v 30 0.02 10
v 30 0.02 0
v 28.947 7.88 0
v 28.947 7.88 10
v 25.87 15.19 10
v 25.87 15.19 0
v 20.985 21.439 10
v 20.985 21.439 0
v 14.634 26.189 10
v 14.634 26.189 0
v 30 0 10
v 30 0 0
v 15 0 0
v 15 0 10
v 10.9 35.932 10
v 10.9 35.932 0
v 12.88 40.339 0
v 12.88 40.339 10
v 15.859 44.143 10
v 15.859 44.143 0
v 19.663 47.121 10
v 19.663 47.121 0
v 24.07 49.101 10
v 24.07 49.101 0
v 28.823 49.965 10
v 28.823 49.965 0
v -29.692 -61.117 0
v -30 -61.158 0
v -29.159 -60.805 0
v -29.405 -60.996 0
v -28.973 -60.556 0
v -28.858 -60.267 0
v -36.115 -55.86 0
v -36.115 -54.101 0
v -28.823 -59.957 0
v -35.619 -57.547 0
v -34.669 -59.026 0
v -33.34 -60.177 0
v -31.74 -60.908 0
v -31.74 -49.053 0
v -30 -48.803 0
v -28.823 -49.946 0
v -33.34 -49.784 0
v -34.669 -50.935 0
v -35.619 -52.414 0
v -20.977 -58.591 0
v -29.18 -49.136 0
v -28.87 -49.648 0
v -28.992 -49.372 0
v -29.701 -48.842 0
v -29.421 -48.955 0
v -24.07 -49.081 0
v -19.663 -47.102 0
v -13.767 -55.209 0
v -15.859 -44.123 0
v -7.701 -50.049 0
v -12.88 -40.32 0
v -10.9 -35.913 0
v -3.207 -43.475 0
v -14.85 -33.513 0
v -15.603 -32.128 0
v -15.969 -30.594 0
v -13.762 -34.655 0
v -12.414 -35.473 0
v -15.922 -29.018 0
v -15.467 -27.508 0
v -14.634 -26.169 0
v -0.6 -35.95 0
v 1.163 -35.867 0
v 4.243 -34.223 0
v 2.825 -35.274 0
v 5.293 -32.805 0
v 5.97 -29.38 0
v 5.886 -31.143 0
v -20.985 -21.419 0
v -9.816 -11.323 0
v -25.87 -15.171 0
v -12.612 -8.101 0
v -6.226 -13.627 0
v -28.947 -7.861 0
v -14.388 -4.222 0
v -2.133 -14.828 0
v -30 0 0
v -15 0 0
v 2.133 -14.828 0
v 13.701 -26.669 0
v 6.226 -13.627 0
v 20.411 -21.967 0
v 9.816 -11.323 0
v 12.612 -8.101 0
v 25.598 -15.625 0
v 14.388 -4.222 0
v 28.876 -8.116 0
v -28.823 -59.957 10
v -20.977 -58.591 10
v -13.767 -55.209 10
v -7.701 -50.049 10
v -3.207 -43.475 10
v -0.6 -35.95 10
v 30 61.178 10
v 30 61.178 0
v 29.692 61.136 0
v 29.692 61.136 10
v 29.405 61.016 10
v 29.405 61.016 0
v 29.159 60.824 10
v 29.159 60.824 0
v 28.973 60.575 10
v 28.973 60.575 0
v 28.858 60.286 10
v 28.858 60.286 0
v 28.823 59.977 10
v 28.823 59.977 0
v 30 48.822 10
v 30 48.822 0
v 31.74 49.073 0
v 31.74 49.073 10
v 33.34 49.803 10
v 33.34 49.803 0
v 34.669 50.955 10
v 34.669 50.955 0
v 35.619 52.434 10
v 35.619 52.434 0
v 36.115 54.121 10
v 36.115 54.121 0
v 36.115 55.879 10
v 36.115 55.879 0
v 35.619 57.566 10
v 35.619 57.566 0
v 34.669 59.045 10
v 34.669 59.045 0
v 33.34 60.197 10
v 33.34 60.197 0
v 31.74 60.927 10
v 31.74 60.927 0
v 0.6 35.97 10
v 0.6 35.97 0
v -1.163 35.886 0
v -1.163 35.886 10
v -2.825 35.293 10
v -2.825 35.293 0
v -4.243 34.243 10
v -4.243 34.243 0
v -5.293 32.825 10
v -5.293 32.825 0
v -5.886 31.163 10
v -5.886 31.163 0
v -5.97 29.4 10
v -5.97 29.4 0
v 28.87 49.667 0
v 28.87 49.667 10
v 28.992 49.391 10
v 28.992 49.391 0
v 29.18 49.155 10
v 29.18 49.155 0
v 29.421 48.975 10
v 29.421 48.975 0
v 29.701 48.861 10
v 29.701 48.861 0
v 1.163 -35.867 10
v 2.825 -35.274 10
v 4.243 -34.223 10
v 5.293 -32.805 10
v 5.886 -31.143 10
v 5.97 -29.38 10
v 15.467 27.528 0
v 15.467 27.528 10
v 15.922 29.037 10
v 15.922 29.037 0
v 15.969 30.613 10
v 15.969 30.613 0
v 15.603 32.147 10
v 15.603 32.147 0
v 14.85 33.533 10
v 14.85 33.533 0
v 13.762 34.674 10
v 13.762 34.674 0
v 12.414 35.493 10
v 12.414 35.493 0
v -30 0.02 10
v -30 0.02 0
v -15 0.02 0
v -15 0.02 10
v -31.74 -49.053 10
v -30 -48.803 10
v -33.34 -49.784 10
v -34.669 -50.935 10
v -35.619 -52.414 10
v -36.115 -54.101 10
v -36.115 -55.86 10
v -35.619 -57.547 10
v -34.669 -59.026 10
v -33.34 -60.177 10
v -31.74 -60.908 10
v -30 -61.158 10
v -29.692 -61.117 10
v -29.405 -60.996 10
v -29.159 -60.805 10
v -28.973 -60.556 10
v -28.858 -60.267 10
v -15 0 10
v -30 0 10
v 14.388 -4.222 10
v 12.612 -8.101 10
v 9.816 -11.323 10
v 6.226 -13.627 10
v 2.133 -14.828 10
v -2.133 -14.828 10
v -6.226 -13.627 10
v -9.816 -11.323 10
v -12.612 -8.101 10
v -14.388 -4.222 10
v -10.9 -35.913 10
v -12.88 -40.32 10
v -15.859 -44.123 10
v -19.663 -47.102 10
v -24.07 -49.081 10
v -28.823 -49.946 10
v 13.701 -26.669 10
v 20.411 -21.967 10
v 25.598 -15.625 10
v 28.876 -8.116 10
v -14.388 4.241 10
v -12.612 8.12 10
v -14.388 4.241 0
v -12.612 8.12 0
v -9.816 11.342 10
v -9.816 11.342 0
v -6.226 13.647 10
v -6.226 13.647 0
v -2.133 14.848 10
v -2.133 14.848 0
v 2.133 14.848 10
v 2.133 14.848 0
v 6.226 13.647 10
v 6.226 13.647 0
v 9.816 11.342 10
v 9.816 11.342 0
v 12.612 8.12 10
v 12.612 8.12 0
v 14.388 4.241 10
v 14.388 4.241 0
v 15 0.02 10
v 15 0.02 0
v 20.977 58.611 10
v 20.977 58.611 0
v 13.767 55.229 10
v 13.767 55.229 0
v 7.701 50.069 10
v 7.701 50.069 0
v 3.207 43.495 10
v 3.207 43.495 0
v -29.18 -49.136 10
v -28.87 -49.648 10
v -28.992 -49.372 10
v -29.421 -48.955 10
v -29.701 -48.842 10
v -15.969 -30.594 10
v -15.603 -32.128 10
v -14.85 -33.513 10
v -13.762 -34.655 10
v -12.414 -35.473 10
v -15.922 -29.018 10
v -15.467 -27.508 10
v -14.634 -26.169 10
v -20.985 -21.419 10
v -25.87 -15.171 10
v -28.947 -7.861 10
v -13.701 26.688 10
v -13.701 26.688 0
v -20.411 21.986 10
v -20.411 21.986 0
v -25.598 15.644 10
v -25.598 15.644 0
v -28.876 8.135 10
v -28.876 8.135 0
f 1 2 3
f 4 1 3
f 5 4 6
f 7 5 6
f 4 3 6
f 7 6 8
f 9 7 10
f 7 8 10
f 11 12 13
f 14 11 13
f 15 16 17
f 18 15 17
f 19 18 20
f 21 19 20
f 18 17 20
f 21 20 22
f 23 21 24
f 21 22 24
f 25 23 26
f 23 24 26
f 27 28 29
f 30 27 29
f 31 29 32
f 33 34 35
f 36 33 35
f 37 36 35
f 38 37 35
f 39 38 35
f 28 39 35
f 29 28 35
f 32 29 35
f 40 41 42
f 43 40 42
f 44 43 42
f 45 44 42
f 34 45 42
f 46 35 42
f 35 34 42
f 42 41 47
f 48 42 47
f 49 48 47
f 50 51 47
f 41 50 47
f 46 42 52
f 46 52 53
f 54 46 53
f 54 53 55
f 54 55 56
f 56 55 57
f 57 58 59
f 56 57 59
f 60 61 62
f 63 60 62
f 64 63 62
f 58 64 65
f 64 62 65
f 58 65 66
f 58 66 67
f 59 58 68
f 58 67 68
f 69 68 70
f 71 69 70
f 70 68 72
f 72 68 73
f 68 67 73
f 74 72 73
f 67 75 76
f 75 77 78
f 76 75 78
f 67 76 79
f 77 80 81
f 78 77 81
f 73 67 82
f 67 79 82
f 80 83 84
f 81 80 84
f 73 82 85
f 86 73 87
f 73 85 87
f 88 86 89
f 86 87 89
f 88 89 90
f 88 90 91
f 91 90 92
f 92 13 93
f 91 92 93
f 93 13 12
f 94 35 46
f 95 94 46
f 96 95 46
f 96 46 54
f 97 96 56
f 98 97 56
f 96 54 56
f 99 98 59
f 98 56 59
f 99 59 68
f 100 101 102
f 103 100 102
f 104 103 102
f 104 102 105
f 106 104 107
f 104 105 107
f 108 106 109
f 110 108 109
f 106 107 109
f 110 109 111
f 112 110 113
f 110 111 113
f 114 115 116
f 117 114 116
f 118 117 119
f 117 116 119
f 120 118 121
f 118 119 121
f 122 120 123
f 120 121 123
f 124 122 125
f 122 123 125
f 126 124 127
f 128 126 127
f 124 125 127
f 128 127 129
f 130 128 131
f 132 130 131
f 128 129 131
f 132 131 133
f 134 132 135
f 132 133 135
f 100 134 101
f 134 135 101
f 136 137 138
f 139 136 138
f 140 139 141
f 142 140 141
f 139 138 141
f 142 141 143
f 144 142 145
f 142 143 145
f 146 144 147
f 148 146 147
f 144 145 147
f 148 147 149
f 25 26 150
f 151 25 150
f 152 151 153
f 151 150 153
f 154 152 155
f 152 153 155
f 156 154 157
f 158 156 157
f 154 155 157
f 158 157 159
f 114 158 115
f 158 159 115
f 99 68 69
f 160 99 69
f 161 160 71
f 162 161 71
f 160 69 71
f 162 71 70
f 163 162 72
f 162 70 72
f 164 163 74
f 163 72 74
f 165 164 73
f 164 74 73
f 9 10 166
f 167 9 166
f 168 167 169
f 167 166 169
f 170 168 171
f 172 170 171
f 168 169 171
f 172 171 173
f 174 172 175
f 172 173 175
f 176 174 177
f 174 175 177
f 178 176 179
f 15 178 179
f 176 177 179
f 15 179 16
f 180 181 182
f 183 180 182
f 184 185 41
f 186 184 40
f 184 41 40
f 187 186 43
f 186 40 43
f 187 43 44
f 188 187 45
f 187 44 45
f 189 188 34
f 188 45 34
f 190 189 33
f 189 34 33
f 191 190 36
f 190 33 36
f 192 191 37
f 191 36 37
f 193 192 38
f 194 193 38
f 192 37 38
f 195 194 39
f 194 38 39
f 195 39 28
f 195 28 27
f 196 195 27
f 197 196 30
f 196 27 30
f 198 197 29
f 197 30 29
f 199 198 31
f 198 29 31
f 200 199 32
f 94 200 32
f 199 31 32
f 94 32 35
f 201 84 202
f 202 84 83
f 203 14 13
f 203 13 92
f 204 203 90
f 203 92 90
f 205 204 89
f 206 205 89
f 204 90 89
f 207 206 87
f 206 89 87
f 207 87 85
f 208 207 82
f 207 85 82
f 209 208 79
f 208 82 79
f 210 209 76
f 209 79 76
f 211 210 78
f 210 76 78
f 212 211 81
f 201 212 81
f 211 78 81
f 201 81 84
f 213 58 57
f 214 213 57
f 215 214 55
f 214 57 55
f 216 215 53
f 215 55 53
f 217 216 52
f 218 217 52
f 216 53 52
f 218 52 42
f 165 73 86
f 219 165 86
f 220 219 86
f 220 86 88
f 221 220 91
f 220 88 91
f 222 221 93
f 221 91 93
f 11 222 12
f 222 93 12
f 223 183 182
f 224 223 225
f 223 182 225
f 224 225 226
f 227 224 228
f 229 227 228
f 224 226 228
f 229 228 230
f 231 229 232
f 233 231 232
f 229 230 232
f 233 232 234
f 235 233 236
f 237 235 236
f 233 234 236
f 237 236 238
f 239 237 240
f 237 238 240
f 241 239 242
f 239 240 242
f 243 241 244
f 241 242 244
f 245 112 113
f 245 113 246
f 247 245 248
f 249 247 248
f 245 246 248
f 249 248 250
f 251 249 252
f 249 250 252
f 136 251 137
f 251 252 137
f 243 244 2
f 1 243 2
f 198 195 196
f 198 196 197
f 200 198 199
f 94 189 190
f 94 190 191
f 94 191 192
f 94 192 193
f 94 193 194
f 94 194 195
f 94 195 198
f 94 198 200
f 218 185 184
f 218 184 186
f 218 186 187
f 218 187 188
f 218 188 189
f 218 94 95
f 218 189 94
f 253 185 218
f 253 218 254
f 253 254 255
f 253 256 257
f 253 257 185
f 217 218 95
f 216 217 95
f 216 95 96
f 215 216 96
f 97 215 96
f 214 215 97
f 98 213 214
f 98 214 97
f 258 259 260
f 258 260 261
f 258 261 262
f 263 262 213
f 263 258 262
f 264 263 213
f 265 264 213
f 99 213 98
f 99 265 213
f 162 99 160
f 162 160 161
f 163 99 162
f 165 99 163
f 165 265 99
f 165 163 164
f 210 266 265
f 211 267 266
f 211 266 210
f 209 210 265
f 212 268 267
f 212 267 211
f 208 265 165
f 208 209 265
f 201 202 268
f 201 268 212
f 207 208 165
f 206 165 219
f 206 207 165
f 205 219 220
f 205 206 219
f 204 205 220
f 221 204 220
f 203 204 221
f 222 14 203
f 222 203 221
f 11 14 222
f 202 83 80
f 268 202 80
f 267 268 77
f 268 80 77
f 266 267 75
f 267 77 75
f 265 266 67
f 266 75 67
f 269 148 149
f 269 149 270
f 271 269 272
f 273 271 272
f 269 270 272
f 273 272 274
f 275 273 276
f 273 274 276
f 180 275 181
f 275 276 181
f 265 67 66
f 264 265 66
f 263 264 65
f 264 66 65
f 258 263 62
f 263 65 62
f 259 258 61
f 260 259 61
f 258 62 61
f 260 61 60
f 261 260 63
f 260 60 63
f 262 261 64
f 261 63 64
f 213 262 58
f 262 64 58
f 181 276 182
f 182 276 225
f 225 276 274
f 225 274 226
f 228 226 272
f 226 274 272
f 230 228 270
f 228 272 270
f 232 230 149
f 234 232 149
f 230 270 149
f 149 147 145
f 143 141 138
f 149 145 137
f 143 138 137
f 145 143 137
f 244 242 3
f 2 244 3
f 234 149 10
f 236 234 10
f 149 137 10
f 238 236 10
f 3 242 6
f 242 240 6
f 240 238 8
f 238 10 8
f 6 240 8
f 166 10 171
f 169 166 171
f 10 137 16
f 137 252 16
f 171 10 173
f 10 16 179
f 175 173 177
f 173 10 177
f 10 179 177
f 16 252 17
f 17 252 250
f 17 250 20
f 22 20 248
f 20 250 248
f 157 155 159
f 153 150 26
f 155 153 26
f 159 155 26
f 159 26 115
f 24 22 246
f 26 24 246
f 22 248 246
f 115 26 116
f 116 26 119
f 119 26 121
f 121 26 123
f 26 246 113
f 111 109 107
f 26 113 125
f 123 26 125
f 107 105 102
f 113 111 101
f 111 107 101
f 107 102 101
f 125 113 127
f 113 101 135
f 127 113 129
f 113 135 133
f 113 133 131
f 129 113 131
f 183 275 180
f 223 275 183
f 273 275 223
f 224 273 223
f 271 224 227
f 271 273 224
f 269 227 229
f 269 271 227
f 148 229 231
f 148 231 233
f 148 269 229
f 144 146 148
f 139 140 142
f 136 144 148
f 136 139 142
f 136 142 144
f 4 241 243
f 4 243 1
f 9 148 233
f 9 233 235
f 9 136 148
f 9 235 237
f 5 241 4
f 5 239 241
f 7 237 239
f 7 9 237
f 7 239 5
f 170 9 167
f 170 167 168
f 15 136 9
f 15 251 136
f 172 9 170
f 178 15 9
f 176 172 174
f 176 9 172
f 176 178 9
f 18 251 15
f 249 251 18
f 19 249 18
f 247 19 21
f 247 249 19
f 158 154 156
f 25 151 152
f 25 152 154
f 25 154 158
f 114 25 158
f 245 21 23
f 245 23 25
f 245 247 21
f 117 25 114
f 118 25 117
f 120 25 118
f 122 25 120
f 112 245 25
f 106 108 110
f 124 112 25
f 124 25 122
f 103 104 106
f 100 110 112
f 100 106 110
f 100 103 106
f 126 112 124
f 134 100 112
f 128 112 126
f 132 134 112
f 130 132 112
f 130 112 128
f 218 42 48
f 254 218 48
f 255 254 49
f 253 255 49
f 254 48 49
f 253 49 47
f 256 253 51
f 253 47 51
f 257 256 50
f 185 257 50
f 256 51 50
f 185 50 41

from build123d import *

# Parameters (mm, degrees)
F1_DEPTH = 10


# Not quite as in the source:
# - ends of sketch curves that miss each other by under 0.0002 mm in the source are joined


with BuildPart() as f1:
    # F0 (on Top) → F1 (new body)
    with BuildSketch(Plane.XY):
        with BuildLine():
            Line((30, 0), (15, 0))
            ThreePointArc((15, 0), (6.697e-07, -14.9804429115), (-14.9999865801, 1.75e-08))
            Line((-14.9999865801, 1.75e-08), (-30, 0))
            ThreePointArc((-30, 0), (-25.8699353497, -15.1707822858), (-14.6339808876, -26.1691157255))
            ThreePointArc((-14.6339808876, -26.1691157255), (-15.6026691532, -32.1275551224), (-10.8999993294, -35.9125588915))
            ThreePointArc((-10.8999993294, -35.9125588915), (-17.6702744626, -45.7277564826), (-28.8229878287, -49.94577897))
            ThreePointArc((-28.8229878287, -49.94577897), (-29.1797127595, -49.1356425772), (-29.9999993294, -48.8029210808))
            ThreePointArc((-29.9999993294, -48.8029210808), (-36.1775211601, -54.9804429115), (-29.9999993294, -61.1579647422))
            ThreePointArc((-29.9999993294, -61.1579647422), (-29.1592349866, -60.8048657287), (-28.8227042848, -59.9573336171))
            ThreePointArc((-28.8227042848, -59.9573336171), (-10.5622435899, -52.8315621797), (-0.5999993294, -35.9503675342))
            ThreePointArc((-0.5999993294, -35.9503675342), (4.2426413577, -34.2230835986), (5.9699252932, -29.3804429115))
            ThreePointArc((5.9699252932, -29.3804429115), (23.222002332, -18.9735637408), (30, 0))
        make_face()
    extrude(amount=F1_DEPTH)


with BuildPart() as f1b:
    # F0 (on Top) → F1, piece 2 (new body)
    with BuildSketch(Plane.XY):
        with BuildLine():
            ThreePointArc((-14.9999872507, 0.0195570727), (9e-10, 15), (14.9999872507, 0.019557071))
            Line((14.9999872507, 0.019557071), (30.0000006706, 0.0195570885))
            ThreePointArc((30.0000006706, 0.0195570885), (25.8699360203, 15.1903393743), (14.6339815581, 26.188672814))
            ThreePointArc((14.6339815581, 26.188672814), (15.6026698237, 32.1471122109), (10.9, 35.93211598))
            ThreePointArc((10.9, 35.93211598), (17.6702751331, 45.7473135711), (28.8229884993, 49.9653360585))
            ThreePointArc((28.8229884993, 49.9653360585), (29.17971343, 49.1551996657), (30, 48.8224781693))
            ThreePointArc((30, 48.8224781693), (36.1775218307, 55), (30, 61.1775218307))
            ThreePointArc((30, 61.1775218307), (29.1592356572, 60.8244228172), (28.8227049553, 59.9768907056))
            ThreePointArc((28.8227049553, 59.9768907056), (10.5622442605, 52.8511192682), (0.6, 35.9699246226))
            ThreePointArc((0.6, 35.9699246226), (-4.2426406871, 34.2426406871), (-5.9699246226, 29.4))
            ThreePointArc((-5.9699246226, 29.4), (-23.2220016615, 18.9931208293), (-29.9999936253, 0.0195570848))
            Line((-29.9999936253, 0.0195570848), (-14.9999872507, 0.0195570727))
        make_face()
    extrude(amount=F1_DEPTH)


solid = Compound([f1.part, f1b.part])
